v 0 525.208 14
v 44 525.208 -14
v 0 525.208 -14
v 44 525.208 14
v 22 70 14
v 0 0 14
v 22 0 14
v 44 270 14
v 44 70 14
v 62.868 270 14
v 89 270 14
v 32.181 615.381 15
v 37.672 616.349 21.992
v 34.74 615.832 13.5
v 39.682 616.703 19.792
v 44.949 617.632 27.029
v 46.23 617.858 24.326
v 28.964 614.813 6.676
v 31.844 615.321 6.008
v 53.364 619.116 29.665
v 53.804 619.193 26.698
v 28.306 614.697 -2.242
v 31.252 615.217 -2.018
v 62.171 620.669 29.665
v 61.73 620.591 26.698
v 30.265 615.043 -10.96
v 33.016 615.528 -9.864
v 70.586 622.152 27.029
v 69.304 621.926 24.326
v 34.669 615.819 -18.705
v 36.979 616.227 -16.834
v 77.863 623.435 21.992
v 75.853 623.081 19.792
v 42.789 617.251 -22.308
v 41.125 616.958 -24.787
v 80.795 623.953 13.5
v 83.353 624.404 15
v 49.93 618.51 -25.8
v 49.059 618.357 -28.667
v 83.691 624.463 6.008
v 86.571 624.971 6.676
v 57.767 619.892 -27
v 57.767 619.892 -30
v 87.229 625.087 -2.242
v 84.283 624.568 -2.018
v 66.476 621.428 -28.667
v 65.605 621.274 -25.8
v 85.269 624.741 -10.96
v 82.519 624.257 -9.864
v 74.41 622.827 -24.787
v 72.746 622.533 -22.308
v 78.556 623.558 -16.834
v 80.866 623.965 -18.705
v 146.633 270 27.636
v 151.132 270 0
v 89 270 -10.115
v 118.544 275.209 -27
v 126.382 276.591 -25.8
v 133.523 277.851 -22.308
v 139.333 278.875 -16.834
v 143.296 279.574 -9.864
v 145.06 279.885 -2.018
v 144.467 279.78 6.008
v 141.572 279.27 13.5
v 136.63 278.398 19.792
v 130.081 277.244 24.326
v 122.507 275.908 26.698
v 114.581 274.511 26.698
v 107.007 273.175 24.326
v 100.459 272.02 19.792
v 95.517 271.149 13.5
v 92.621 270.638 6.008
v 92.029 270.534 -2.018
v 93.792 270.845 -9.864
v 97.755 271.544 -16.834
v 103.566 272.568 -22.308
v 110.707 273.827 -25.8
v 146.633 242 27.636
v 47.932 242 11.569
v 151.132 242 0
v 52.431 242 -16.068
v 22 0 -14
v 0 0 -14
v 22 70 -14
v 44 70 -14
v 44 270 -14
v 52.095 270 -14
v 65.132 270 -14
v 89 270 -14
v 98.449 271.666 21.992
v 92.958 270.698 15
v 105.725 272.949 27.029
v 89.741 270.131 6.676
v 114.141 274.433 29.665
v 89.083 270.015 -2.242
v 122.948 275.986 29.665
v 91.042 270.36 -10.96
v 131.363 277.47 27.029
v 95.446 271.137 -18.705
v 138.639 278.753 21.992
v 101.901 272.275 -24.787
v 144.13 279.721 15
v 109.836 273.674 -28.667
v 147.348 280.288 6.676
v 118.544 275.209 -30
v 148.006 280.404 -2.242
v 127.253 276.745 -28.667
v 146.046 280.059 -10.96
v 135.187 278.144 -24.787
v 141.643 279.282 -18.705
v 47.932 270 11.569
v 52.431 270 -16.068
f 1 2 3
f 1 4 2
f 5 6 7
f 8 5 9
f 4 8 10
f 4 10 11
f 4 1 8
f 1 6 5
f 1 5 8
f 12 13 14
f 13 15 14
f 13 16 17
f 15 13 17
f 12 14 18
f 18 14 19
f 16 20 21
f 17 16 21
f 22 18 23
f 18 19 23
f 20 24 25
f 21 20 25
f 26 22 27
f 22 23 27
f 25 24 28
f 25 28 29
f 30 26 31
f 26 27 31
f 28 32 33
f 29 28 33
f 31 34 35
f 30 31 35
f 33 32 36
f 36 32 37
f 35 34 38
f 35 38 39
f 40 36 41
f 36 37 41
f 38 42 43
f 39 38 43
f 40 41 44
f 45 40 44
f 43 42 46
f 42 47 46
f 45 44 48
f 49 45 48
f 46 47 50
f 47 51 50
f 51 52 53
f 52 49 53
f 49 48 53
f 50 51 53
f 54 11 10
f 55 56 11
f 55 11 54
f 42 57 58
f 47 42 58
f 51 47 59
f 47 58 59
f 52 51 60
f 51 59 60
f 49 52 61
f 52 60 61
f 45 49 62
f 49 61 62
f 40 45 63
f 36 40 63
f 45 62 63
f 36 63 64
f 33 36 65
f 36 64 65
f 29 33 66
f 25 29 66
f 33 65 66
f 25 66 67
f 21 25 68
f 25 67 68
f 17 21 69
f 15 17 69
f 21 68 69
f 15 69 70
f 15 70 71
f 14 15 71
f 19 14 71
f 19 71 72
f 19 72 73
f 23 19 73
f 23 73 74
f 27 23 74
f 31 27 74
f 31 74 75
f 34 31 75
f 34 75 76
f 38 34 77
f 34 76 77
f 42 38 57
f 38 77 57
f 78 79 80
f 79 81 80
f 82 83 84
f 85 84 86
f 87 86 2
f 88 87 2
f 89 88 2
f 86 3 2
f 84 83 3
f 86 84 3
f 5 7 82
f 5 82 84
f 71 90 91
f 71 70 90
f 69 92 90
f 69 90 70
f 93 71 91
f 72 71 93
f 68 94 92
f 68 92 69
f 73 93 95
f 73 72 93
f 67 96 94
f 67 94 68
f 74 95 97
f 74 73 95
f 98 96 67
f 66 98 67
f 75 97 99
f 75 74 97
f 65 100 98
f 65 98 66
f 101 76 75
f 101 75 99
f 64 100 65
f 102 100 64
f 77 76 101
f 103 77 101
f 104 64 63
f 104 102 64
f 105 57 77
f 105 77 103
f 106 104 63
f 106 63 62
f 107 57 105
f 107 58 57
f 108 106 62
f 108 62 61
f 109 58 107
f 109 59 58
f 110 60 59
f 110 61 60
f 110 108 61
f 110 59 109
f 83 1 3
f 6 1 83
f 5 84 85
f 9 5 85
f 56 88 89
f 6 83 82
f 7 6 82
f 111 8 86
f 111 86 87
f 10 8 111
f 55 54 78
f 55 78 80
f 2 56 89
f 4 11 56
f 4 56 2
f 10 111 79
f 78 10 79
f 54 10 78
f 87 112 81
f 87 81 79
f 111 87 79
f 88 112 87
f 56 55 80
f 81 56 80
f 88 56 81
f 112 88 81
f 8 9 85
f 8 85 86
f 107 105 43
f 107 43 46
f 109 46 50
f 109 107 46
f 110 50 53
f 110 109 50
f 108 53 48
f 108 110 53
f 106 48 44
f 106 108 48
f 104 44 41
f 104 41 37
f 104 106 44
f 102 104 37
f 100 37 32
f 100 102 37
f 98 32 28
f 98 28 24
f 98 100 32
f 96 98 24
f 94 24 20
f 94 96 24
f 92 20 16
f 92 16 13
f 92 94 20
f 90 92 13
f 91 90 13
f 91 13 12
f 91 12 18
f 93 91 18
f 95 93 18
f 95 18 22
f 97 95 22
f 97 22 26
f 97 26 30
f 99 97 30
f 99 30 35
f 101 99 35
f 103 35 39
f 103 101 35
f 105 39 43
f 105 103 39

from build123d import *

# Parameters (mm, degrees)
MAIN_EXTRUSION_DEPTH = 14
LOCK_EXTRUSION_DEPTH = 28
ESQUISSE3_R          = 30
ESQUISSE3_R_2        = 27
PLEXIGLAS_DEPTH      = 350


with BuildPart() as part:
    # Esquisse1 → Main Extrusion (new body, symmetric)
    with BuildSketch(Plane.XY):
        Polygon((0, 525.207681883), (0, 0), (22, 0), (22, 70), (44, 70), (44, 270), (89, 270), (44, 525.207681883), align=None)
    extrude(amount=MAIN_EXTRUSION_DEPTH, both=True)

    # Esquisse2 → Lock Extrusion (add)
    with BuildSketch(Plane(origin=(0, 270, 0), x_dir=(-1, 0, 0), z_dir=(0, -1, 0))):
        Polygon((-47.932439792, -11.56864335), (-146.633166785, -27.636203558), (-151.132083643, 0), (-52.43135665, 16.067560208), align=None)
    extrude(amount=LOCK_EXTRUSION_DEPTH)


with BuildPart() as body_2:
    # Esquisse3 → Plexiglas (new body)
    with BuildSketch(Plane(origin=(-43.489040974, 246.638607428, 0), x_dir=(0, 0, -1), z_dir=(0.173648178, -0.984807753, 0))):
        with Locations((0, 164.532897988)):
            Circle(ESQUISSE3_R)
        with Locations((0, 164.532897988)):
            Circle(ESQUISSE3_R_2, mode=Mode.SUBTRACT)
    extrude(amount=-PLEXIGLAS_DEPTH)


solid = Compound([part.part, body_2.part])
